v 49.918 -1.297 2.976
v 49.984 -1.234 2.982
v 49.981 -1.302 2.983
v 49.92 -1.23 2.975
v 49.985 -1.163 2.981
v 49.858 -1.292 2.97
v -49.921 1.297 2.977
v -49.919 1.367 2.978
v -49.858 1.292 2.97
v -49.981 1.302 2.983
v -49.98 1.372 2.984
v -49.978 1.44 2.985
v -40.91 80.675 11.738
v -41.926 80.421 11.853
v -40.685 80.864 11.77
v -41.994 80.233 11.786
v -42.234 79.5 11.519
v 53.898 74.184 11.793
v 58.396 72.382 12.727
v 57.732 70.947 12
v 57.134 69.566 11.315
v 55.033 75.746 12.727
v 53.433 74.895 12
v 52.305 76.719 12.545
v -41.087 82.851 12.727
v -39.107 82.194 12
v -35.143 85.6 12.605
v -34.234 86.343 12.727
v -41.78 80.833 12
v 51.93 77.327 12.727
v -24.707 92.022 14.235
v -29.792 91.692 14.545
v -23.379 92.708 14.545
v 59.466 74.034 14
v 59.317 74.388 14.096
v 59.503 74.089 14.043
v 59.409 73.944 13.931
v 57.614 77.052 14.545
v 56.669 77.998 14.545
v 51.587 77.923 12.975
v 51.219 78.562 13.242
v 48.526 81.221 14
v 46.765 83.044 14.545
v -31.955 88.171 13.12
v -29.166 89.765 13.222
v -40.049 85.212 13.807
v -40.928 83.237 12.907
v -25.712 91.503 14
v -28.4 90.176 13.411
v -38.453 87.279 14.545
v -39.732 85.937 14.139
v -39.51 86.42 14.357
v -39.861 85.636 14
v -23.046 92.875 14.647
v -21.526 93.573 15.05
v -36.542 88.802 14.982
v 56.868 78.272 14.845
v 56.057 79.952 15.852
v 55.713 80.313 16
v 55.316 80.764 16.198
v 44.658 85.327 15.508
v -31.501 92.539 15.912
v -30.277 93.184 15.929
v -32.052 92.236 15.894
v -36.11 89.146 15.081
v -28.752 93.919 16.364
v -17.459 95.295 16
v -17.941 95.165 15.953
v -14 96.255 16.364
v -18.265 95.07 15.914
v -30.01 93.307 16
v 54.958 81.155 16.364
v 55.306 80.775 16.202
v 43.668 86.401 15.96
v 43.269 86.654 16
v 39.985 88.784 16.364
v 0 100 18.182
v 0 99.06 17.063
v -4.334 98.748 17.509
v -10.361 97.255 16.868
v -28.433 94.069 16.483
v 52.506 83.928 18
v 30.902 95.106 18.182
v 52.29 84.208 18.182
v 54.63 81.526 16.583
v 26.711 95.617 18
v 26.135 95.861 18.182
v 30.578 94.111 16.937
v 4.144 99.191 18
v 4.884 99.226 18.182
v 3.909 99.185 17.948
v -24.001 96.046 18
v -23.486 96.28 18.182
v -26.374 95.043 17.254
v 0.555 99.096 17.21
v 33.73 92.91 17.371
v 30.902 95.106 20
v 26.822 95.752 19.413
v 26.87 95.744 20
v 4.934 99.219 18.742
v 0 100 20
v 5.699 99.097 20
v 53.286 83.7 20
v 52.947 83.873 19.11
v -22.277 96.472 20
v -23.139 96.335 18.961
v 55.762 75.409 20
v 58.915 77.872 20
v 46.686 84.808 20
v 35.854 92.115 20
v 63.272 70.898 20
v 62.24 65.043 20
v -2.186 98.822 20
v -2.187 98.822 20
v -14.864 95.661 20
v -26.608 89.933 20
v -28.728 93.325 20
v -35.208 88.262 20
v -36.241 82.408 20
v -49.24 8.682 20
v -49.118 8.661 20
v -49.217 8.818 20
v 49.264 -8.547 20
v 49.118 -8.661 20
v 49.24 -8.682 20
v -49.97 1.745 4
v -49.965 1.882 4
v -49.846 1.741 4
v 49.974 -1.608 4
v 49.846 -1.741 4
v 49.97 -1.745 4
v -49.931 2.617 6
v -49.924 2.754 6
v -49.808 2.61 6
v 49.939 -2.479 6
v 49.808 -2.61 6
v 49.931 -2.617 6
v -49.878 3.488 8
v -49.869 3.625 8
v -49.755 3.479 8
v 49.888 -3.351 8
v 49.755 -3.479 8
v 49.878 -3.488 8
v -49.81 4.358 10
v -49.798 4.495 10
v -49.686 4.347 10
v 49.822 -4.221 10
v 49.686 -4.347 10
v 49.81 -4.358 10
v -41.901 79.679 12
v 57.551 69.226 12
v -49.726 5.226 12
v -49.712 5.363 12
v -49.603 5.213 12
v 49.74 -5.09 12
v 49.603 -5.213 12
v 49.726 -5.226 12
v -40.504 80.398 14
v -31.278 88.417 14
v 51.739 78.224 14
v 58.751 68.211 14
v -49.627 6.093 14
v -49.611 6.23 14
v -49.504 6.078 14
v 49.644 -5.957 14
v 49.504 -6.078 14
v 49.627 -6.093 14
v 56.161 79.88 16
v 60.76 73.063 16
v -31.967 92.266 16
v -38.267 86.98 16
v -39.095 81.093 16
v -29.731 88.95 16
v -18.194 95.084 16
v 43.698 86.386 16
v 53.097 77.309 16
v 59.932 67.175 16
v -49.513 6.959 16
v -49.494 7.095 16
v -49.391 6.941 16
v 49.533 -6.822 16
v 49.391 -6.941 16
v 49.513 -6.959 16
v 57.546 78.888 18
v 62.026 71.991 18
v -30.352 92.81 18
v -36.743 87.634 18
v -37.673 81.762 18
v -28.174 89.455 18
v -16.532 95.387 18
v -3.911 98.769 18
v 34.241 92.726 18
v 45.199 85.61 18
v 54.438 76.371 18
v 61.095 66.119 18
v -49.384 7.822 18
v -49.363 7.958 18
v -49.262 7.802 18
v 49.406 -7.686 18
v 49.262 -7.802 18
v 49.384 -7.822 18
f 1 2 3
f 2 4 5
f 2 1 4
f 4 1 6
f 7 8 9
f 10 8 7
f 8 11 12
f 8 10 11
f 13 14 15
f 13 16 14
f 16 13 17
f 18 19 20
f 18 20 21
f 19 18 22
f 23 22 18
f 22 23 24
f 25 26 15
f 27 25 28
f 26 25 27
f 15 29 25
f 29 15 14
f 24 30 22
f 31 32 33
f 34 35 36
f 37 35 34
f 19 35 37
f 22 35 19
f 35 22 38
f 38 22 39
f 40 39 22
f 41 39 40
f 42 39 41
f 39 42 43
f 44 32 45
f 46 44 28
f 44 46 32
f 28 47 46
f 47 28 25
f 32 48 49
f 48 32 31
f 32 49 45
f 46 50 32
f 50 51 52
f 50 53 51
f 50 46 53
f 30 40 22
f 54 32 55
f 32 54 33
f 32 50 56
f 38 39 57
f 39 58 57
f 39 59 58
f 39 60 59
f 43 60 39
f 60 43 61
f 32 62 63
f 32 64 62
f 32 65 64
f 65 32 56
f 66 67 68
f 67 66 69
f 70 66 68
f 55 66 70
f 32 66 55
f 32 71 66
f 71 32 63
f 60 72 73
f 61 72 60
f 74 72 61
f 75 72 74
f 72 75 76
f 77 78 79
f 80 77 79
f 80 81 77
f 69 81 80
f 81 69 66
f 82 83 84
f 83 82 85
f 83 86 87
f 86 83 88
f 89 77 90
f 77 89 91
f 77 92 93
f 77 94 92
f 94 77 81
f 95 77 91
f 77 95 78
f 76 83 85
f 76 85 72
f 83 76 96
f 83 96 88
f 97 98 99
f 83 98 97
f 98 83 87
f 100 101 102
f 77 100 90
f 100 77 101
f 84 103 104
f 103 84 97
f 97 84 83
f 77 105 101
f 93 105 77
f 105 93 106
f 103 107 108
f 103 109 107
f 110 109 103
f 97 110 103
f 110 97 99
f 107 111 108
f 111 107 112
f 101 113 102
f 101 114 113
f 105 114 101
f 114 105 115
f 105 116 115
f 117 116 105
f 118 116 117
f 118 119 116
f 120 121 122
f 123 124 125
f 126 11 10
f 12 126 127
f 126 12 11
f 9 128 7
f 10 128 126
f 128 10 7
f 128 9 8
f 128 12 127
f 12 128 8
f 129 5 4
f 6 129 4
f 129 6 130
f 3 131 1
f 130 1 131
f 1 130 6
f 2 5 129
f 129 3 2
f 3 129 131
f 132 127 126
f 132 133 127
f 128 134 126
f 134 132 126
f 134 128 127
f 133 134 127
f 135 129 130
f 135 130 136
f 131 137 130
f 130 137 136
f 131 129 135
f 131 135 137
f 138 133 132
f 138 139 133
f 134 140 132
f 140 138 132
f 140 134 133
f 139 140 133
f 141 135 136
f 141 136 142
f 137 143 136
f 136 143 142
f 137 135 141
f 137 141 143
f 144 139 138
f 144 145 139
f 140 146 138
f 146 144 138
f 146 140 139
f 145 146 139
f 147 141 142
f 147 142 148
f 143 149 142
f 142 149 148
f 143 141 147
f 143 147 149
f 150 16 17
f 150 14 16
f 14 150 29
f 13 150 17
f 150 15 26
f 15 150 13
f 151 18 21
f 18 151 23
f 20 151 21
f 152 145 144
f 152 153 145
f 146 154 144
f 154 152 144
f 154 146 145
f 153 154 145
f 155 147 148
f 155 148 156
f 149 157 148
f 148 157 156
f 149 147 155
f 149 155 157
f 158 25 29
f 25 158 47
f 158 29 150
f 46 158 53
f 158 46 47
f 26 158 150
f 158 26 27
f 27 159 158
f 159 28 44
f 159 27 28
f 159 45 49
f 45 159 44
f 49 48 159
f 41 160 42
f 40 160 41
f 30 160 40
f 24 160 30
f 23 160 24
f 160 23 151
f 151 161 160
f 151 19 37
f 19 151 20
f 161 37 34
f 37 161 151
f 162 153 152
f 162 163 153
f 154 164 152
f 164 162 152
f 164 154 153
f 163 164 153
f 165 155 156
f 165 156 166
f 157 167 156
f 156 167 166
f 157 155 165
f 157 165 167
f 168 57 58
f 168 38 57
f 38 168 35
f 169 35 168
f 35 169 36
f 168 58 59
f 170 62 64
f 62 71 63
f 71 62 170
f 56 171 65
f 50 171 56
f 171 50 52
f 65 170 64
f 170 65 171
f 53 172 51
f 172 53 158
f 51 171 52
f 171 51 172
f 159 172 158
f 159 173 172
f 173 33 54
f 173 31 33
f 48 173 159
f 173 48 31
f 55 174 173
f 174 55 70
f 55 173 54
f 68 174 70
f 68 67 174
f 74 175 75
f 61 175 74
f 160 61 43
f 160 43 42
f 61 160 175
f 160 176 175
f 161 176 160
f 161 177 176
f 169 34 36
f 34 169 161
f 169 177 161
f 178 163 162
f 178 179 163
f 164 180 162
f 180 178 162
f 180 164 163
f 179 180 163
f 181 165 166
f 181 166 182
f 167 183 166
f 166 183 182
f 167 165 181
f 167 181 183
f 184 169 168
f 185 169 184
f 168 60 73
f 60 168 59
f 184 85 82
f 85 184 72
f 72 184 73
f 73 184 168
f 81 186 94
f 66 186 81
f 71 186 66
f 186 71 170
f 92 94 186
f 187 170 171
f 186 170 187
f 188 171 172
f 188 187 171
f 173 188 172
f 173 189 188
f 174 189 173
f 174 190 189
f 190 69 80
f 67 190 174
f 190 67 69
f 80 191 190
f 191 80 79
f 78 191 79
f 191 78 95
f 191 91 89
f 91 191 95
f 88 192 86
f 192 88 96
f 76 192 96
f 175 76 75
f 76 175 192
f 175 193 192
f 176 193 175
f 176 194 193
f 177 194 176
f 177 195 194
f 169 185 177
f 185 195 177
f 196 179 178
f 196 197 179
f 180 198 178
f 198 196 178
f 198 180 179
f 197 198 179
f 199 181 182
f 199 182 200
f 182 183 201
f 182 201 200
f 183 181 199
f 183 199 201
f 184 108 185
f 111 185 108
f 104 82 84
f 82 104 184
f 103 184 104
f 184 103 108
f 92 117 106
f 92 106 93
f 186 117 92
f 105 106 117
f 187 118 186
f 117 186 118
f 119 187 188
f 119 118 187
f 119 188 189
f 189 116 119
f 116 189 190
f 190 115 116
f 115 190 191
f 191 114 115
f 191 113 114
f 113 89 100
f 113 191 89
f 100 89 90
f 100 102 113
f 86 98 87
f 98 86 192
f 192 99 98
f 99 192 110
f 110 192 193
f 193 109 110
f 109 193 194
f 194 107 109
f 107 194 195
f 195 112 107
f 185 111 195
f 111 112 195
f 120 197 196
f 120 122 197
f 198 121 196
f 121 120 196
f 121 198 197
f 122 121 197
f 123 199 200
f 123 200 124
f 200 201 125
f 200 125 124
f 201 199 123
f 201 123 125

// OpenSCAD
module testing1p1(length, width, height)
{
    radius = (pow(length,2) + 4*pow(height,2))/(8*height);
    translate([0,-radius+height,0])
    difference()
    {
        color("grey")circle(r=radius+width);
        color("orange")circle(r=(radius));
    }
}
//

module testing1p2(length, width, height)
{
    radius = (pow(length,2) + 4*pow(height,2))/(8*height);
    translate([-(radius+width),-(radius+width)*2,0,])
    color("green")square([(radius+width)*2,(radius+width)*2]);
}
//

module testing2(length, width, height)
{

    union() 
    {
        translate([-length,-height]) 
        square([length/2,height*2]);
        translate([length/2,-height])     
        square([length/2,height*2]);
    }
}
//

module myarc(length, width, height)
{
    //r = (l^2 + 4*b^2)/8*b 
    radius = (pow(length,2) + 4*pow(height,2))/(8*height);
    //echo(radius);
    translate([length/2,0,0])
    difference() 
    {
        difference() 
        {
            translate([0,-radius+height,0])
            difference() 
            {
                circle(r=radius+width);
                circle(r=(radius));
            }
            
            translate([-(radius+width),-(radius+width)*2,0,])
            square([(radius+width)*2,(radius+width)*2]);
        }
        union() 
        {
            translate([-length,-height]) 
            square([length/2,height*2]);
            translate([length/2,-height])     
            square([length/2,height*2]);
        }
    }
}
//

module compositing(length = 100, width = 4, height = 100)
{
    //myarc(100, 4, 100);//simulates this
    difference()
    {
        testing1p1(100, 4, 100);
        testing1p2(100, 4, 100);
        testing2(100, 4, 100);
    }    
}
//


union()
{
    intersection()
    {
        color("green")union() 
        {
            bot_r = 100/6;
            top_r = 100;
            delta_r = top_r - bot_r;
            
            exp_pow = 3;
            end_point = 1 - 1/exp(exp_pow*1); 
            offset_slicing = round(10*(1/((100-10)/100))); 
            layer_h = 20/offset_slicing;
            for (i=[0:offset_slicing-1])
            {
                if (i < 10) 
                { 
                    offset_r = delta_r*((1-1/exp(exp_pow*(i/10)))/end_point); //Normalised N
                    offset_r_increment = delta_r*((1-1/exp(exp_pow*((i+1)/10)))/end_point); //Normalised N+1  
                    translate([0,0,i*layer_h])
                    cylinder(layer_h, bot_r + offset_r, bot_r + offset_r_increment, center=false, $fn=20);
                }
                else 
                {
                    translate([0,0,i*layer_h])
                    cylinder(layer_h, top_r, top_r, center=false, $fn=20);
                }    
            }
        }
        
        linear_extrude(height=20, centre=false, convexity=10, twist=10, slices=10)
        {
            compositing();
        }
    }
}
